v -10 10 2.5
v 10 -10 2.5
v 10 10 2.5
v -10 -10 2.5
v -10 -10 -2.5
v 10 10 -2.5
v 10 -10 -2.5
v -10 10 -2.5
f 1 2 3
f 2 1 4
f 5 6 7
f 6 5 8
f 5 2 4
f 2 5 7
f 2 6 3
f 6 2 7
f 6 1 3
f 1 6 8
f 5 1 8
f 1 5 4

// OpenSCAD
module OpenBox(length, width, height, wallThickness, center=true)
{
    echo(length=length, width=width, height=height, wallThickness=wallThickness, center=center)
    //union()
    //{
        color("red") cube([length, width, height], center=center);
        //translate([0,0,wallThickness])color("pink") cube(length-wallThickness,width-wallThickness,height, center=center);
    //}
}


module TestOpenBox()
{
    OpenBox(20,20,5,2);
}


//run tests
TestOpenBox();
